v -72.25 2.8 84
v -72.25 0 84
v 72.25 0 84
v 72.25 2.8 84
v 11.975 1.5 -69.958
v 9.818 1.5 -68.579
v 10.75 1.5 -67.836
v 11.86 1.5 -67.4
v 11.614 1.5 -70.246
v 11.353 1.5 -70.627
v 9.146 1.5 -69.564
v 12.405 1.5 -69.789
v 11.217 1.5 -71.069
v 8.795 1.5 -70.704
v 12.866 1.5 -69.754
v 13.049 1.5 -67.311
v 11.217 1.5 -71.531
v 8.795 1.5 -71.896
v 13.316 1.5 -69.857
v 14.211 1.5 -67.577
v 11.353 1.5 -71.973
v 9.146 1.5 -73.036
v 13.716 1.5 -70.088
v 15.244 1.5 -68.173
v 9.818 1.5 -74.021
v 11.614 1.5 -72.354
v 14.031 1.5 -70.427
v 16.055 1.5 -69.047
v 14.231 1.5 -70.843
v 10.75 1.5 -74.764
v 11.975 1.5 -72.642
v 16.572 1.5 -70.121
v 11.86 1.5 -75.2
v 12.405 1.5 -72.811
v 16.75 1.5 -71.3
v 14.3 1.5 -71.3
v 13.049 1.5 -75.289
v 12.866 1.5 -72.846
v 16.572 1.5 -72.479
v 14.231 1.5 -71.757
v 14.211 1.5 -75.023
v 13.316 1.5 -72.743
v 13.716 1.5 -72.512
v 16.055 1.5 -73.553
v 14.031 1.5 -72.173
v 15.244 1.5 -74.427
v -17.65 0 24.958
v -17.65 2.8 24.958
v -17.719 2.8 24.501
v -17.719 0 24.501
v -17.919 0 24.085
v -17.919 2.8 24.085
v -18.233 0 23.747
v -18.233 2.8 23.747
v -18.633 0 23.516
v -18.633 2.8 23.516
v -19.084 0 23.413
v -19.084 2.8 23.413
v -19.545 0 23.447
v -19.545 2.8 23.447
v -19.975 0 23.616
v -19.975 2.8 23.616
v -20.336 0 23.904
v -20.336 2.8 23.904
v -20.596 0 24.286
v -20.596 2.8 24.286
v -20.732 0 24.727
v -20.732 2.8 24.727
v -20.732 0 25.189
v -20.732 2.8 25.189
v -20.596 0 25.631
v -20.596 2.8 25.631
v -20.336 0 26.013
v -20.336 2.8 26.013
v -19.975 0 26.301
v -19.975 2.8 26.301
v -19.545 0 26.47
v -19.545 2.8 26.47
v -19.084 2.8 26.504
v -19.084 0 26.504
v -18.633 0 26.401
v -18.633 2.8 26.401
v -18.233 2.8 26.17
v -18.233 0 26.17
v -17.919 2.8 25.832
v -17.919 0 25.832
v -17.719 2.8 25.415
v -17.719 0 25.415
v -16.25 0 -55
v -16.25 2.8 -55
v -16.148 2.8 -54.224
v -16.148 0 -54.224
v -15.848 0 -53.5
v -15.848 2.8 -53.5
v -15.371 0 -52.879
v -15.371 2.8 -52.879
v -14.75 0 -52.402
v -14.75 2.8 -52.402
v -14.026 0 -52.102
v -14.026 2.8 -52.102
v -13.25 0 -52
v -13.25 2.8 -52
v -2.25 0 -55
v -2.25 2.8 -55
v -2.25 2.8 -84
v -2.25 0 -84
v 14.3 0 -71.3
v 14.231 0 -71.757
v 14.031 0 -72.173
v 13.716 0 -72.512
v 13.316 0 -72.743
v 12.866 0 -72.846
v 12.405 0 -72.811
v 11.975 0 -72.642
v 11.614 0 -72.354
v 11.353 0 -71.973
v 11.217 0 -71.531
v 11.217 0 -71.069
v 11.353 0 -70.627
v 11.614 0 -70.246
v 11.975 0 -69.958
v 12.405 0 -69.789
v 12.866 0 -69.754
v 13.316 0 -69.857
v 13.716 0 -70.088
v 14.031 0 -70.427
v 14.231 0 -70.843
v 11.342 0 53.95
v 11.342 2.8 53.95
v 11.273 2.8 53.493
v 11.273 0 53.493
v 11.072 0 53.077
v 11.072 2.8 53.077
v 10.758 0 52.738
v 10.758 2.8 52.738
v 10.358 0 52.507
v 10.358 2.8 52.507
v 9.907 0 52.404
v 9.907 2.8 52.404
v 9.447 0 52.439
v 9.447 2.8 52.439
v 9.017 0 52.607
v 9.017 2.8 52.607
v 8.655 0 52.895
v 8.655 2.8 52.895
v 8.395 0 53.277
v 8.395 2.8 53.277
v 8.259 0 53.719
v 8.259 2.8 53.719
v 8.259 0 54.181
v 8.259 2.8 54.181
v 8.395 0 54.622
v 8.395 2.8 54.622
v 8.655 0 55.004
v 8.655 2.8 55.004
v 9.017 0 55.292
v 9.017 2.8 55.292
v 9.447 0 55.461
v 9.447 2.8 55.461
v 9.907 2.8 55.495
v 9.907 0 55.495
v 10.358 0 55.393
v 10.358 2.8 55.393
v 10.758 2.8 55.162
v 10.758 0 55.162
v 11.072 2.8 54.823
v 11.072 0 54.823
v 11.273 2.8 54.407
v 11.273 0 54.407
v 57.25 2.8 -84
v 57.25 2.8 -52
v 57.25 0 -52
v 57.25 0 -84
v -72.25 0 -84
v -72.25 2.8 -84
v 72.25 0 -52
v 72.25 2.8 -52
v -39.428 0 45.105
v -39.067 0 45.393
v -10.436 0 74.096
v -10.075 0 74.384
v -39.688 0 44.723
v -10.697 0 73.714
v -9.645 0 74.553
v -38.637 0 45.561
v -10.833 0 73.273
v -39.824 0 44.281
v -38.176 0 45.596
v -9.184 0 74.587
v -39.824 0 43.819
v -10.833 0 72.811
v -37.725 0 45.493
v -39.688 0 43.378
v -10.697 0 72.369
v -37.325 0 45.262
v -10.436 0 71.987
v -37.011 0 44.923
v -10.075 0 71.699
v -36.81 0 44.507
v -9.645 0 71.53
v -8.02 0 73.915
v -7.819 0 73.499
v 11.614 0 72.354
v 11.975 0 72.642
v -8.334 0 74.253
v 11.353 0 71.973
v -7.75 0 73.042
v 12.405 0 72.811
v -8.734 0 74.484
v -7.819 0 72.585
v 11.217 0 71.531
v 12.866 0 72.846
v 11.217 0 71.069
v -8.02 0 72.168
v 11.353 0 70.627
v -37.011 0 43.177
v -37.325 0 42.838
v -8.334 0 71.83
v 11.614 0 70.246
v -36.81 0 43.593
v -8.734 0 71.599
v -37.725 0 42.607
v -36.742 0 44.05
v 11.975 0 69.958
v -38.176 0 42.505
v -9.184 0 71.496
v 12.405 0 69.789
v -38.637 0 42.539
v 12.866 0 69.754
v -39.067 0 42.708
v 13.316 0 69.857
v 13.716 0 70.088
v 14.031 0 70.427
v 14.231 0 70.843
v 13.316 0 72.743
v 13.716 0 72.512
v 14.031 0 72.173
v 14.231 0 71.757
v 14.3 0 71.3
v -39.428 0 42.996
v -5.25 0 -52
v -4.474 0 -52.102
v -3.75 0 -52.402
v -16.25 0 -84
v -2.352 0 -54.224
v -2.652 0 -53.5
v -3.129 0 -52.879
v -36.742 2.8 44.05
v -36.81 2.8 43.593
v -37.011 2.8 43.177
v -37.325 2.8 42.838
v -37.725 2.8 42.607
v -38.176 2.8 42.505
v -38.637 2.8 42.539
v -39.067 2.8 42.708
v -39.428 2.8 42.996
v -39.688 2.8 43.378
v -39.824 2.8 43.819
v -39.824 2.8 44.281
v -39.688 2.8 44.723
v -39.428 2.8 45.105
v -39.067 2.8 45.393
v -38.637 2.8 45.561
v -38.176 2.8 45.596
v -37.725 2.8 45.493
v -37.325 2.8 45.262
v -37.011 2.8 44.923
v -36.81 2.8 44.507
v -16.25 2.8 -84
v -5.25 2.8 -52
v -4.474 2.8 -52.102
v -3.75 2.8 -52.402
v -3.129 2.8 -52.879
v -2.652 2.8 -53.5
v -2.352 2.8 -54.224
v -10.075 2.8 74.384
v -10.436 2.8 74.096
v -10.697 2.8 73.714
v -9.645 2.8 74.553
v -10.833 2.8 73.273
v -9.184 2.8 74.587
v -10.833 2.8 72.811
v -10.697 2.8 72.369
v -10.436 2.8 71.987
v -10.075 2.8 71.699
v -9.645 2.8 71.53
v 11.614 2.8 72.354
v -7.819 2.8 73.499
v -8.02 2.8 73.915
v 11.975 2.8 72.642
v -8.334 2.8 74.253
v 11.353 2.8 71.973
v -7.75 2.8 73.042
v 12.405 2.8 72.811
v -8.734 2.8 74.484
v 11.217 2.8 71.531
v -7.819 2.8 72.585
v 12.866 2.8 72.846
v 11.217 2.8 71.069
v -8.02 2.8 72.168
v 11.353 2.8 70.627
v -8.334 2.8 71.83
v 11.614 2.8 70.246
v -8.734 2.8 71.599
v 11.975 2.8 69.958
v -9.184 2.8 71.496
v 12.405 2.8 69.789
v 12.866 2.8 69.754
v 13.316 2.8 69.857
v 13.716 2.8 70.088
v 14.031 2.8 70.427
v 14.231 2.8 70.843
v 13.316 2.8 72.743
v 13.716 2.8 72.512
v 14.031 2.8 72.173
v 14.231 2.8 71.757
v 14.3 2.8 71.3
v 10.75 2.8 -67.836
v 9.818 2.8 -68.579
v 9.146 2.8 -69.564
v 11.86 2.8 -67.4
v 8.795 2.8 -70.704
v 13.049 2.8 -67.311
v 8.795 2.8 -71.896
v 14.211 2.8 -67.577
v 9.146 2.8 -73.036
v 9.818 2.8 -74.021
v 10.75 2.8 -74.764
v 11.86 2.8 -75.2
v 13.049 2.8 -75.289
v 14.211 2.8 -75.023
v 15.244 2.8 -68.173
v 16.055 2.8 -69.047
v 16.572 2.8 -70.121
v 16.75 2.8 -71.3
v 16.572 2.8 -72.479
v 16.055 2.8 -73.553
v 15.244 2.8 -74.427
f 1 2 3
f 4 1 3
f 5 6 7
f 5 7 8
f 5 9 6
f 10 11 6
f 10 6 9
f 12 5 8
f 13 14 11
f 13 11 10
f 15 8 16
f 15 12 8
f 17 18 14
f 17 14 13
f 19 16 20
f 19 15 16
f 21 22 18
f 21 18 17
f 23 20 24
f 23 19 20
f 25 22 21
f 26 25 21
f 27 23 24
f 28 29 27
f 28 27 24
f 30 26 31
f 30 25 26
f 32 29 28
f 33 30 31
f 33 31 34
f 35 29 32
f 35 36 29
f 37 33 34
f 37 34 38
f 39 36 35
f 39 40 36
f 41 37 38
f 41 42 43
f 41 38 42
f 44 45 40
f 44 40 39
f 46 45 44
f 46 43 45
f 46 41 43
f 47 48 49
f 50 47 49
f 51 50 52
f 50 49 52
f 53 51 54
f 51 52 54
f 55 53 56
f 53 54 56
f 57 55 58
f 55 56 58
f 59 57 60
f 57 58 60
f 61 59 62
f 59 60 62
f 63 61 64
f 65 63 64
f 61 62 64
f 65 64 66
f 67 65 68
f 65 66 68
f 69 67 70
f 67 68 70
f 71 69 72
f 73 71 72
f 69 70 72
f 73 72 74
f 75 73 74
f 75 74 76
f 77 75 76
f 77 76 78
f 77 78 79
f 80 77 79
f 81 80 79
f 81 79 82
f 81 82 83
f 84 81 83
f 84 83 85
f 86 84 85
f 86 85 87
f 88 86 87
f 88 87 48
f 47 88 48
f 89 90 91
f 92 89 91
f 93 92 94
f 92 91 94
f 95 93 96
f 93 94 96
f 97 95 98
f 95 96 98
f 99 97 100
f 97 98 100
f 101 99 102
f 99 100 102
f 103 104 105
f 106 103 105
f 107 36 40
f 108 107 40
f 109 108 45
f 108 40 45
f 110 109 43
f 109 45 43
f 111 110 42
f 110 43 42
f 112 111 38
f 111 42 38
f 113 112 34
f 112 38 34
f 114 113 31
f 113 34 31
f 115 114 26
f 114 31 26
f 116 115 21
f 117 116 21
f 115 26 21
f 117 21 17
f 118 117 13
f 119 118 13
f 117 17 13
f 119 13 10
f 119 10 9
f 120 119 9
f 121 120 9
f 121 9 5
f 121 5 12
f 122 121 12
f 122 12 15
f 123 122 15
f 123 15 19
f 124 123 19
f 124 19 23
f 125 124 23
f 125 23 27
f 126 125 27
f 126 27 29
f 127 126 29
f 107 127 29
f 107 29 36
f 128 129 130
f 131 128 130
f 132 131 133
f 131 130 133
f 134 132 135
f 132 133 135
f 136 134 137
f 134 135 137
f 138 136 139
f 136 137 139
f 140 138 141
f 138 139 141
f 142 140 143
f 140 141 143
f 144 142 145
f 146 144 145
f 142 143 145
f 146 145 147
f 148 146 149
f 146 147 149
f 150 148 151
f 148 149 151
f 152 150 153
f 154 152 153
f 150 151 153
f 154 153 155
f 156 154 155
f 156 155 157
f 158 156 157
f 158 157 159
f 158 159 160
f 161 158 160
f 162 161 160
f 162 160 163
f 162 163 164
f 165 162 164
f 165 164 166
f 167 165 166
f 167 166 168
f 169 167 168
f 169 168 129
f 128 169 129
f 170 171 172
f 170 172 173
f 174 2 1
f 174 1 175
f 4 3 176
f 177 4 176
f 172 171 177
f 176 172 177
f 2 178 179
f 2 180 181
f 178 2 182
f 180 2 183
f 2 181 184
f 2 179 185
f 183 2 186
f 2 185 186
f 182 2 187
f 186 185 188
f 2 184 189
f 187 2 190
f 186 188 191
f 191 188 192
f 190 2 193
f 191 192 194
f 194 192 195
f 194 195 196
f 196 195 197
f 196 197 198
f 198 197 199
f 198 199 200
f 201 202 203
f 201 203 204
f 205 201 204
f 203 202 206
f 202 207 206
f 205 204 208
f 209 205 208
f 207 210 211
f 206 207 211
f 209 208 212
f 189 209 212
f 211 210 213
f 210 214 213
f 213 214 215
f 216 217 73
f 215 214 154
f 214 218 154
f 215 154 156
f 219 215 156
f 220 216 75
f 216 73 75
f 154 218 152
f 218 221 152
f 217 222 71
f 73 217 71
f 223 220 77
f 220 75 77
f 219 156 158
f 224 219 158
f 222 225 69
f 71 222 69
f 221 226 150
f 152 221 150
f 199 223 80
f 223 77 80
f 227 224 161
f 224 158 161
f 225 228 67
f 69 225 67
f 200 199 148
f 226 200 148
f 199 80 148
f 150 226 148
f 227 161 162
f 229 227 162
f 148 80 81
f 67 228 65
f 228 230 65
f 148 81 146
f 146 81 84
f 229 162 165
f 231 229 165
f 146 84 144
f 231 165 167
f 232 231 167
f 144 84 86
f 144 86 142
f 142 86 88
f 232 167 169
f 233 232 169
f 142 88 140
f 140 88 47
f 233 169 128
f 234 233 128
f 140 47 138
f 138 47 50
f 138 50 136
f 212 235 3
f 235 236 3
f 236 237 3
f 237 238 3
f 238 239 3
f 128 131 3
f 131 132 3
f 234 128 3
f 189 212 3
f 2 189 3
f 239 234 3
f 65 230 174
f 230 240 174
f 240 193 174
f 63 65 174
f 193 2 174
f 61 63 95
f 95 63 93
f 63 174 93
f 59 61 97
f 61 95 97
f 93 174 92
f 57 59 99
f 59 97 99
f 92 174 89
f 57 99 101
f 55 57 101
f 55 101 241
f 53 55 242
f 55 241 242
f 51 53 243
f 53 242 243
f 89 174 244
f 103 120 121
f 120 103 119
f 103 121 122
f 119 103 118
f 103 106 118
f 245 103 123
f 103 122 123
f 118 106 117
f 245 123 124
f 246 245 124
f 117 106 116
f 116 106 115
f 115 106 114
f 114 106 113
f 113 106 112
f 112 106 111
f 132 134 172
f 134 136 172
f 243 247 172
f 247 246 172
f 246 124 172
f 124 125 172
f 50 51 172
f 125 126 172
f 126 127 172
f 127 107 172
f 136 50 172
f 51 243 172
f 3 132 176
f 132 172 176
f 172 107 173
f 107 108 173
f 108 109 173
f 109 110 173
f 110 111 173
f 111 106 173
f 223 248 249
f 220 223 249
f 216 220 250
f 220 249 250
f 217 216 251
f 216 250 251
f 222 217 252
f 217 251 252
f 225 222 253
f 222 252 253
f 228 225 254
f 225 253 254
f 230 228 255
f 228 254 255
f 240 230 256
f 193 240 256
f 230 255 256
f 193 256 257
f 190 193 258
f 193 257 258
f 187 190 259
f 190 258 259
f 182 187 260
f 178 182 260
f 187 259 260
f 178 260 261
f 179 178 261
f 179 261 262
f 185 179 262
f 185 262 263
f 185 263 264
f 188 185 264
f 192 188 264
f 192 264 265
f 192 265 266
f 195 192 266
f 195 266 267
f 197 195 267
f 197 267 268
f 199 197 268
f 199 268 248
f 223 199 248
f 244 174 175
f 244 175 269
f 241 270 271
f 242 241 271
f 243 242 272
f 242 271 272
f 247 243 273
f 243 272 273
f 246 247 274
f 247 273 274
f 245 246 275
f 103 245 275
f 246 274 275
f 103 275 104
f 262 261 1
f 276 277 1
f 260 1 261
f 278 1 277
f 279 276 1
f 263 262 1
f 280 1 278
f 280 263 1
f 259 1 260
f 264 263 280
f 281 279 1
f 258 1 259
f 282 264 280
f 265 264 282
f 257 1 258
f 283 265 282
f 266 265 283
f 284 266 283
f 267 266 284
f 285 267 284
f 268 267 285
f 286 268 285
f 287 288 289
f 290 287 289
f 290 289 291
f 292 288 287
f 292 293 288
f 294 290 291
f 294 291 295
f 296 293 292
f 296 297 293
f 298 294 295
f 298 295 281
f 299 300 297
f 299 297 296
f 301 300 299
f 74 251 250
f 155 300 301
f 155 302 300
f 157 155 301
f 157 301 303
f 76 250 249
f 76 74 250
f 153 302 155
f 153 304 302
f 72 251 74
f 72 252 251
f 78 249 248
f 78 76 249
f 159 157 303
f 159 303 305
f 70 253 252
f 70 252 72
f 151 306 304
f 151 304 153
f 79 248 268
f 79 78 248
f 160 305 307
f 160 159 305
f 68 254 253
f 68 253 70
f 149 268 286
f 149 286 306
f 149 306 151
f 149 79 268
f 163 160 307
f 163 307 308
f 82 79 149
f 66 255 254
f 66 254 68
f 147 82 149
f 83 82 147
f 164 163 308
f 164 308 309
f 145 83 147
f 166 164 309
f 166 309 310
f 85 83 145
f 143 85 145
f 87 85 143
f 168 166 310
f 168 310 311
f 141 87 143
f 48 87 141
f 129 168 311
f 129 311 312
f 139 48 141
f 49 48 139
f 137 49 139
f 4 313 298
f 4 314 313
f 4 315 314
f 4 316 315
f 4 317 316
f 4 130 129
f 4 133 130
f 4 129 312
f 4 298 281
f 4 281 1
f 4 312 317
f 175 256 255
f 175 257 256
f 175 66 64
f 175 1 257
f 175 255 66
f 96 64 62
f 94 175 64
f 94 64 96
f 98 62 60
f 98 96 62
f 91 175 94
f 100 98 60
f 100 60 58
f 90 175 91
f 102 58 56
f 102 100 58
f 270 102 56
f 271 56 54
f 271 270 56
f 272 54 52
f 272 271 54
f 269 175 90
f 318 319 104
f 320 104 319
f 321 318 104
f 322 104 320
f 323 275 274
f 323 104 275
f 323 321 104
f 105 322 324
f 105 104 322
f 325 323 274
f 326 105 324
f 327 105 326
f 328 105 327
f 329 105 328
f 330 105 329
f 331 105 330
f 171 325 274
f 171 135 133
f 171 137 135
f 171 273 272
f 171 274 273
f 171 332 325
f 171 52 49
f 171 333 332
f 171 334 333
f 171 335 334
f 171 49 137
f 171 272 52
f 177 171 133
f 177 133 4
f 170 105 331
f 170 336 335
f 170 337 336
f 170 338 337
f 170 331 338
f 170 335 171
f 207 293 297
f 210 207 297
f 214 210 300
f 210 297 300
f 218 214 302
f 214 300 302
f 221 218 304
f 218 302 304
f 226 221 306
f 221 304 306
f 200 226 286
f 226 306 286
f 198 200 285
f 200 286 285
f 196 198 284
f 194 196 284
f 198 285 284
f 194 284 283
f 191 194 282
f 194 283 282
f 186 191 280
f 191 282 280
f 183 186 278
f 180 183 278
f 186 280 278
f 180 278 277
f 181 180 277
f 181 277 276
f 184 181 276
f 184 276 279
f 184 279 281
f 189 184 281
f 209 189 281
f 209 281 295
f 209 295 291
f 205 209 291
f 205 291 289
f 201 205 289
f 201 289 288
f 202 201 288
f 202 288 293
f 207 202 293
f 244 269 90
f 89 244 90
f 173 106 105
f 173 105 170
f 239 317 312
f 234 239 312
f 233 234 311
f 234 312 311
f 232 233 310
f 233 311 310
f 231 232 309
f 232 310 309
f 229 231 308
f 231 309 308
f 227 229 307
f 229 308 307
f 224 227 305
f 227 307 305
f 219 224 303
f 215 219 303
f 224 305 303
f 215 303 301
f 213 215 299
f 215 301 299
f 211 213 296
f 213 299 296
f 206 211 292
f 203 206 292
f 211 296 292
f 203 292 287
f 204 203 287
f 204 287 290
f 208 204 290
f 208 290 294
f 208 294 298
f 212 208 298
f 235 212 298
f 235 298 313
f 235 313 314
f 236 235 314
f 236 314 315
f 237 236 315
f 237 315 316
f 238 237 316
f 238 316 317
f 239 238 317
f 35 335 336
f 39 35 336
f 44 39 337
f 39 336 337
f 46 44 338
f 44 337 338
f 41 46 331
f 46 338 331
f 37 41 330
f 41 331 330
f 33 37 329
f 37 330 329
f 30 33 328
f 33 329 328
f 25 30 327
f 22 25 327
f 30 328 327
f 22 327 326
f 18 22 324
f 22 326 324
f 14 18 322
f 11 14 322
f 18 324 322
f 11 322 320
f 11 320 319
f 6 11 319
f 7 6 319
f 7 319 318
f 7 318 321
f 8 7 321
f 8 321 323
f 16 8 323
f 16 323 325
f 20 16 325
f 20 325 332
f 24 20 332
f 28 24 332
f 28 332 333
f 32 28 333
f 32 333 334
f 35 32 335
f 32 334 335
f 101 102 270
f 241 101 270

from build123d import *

# Parameters (mm, degrees)
SKETCH1_W           = 144.5
SKETCH1_H           = 168
BOSS_EXTRUDE1_DEPTH = 2.8
CUT_EXTRUDE1_REACH  = 4.8
SKETCH2_R           = 1.55
SKETCH2_W           = 15
SKETCH2_H           = 32
CUT_EXTRUDE2_REACH  = 4.8
SKETCH5_R           = 1.55
SKETCH6_R           = 4
CUT_EXTRUDE3_DEPTH  = 1.3
CUT_EXTRUDE4_REACH  = 4.8


with BuildPart() as part:
    # Sketch1 → Boss-Extrude1 (new body)
    with BuildSketch(Plane(origin=(0, 0, 0), x_dir=(1, 0, 0), z_dir=(0, 1, 0))):
        Rectangle(SKETCH1_W, SKETCH1_H)
    extrude(amount=BOSS_EXTRUDE1_DEPTH)

    # Sketch2 → Cut-Extrude1 (cut, up to next)
    with BuildSketch(Plane(origin=(0, 2.8, 0), x_dir=(1, 0, 0), z_dir=(0, 1, 0)), mode=Mode.PRIVATE) as cut_extrude1_sk1:
        with Locations((-19.199747468, -24.95836944)):
            Circle(SKETCH2_R)
    cut_extrude1_tool1 = extrude(cut_extrude1_sk1.sketch, amount=-CUT_EXTRUDE1_REACH, mode=Mode.PRIVATE) & part.part
    add(cut_extrude1_tool1.solids().sort_by_distance((-19.199747, 2.8, 24.958369))[0], mode=Mode.SUBTRACT)
    # Sketch2 → Cut-Extrude1 (cut, up to next)
    with BuildSketch(Plane(origin=(0, 2.8, 0), x_dir=(1, 0, 0), z_dir=(0, 1, 0)), mode=Mode.PRIVATE) as cut_extrude1_sk2:
        with Locations((9.79163056, -53.949747468)):
            Circle(SKETCH2_R)
    cut_extrude1_tool2 = extrude(cut_extrude1_sk2.sketch, amount=-CUT_EXTRUDE1_REACH, mode=Mode.PRIVATE) & part.part
    add(cut_extrude1_tool2.solids().sort_by_distance((9.791631, 2.8, 53.949747))[0], mode=Mode.SUBTRACT)
    # Sketch2 → Cut-Extrude1 (cut, up to next)
    with BuildSketch(Plane(origin=(0, 2.8, 0), x_dir=(1, 0, 0), z_dir=(0, 1, 0)), mode=Mode.PRIVATE) as cut_extrude1_sk3:
        with Locations((-9.300252532, -73.04163056)):
            Circle(SKETCH2_R)
    cut_extrude1_tool3 = extrude(cut_extrude1_sk3.sketch, amount=-CUT_EXTRUDE1_REACH, mode=Mode.PRIVATE) & part.part
    add(cut_extrude1_tool3.solids().sort_by_distance((-9.300253, 2.8, 73.041631))[0], mode=Mode.SUBTRACT)
    # Sketch2 → Cut-Extrude1 (cut, up to next)
    with BuildSketch(Plane(origin=(0, 2.8, 0), x_dir=(1, 0, 0), z_dir=(0, 1, 0)), mode=Mode.PRIVATE) as cut_extrude1_sk4:
        with Locations((-38.29163056, -44.050252532)):
            Circle(SKETCH2_R)
    cut_extrude1_tool4 = extrude(cut_extrude1_sk4.sketch, amount=-CUT_EXTRUDE1_REACH, mode=Mode.PRIVATE) & part.part
    add(cut_extrude1_tool4.solids().sort_by_distance((-38.291631, 2.8, 44.050253))[0], mode=Mode.SUBTRACT)
    # Sketch2 → Cut-Extrude1 (cut, up to next)
    with BuildSketch(Plane(origin=(0, 2.8, 0), x_dir=(1, 0, 0), z_dir=(0, 1, 0)), mode=Mode.PRIVATE) as cut_extrude1_sk5:
        with Locations((64.75, 68)):
            Rectangle(SKETCH2_W, SKETCH2_H)
    cut_extrude1_tool5 = extrude(cut_extrude1_sk5.sketch, amount=-CUT_EXTRUDE1_REACH, mode=Mode.PRIVATE) & part.part
    add(cut_extrude1_tool5.solids().sort_by_distance((64.75, 2.8, -68))[0], mode=Mode.SUBTRACT)

    # Sketch5 → Cut-Extrude2 (cut, up to next)
    with BuildSketch(Plane(origin=(0, 2.8, 0), x_dir=(1, 0, 0), z_dir=(0, 1, 0)), mode=Mode.PRIVATE) as cut_extrude2_sk1:
        with Locations((12.75, 71.3)):
            Circle(SKETCH5_R)
    cut_extrude2_tool1 = extrude(cut_extrude2_sk1.sketch, amount=-CUT_EXTRUDE2_REACH, mode=Mode.PRIVATE) & part.part
    add(cut_extrude2_tool1.solids().sort_by_distance((12.75, 2.8, -71.3))[0], mode=Mode.SUBTRACT)
    # Sketch5 → Cut-Extrude2 (cut, up to next)
    with BuildSketch(Plane(origin=(0, 2.8, 0), x_dir=(1, 0, 0), z_dir=(0, 1, 0)), mode=Mode.PRIVATE) as cut_extrude2_sk2:
        with Locations((12.75, -71.3)):
            Circle(SKETCH5_R)
    cut_extrude2_tool2 = extrude(cut_extrude2_sk2.sketch, amount=-CUT_EXTRUDE2_REACH, mode=Mode.PRIVATE) & part.part
    add(cut_extrude2_tool2.solids().sort_by_distance((12.75, 2.8, 71.3))[0], mode=Mode.SUBTRACT)

    # Sketch6 → Cut-Extrude3 (cut)
    with BuildSketch(Plane(origin=(0, 2.8, 0), x_dir=(1, 0, 0), z_dir=(0, 1, 0))):
        with Locations((12.75, 71.3)):
            Circle(SKETCH6_R)
    extrude(amount=-CUT_EXTRUDE3_DEPTH, mode=Mode.SUBTRACT)

    # Sketch7 → Cut-Extrude4 (cut, up to next)
    with BuildSketch(Plane(origin=(0, 2.8, 0), x_dir=(1, 0, 0), z_dir=(0, 1, 0)), mode=Mode.PRIVATE) as cut_extrude4_sk1:
        with BuildLine():
            Line((-16.25, 84), (-16.25, 55))
            ThreePointArc((-16.25, 55), (-15.371320344, 52.878679656), (-13.25, 52))
            Line((-13.25, 52), (-5.25, 52))
            ThreePointArc((-5.25, 52), (-3.128679656, 52.878679656), (-2.25, 55))
            Line((-2.25, 55), (-2.25, 84))
            Line((-2.25, 84), (-16.25, 84))
        make_face()
    cut_extrude4_tool1 = extrude(cut_extrude4_sk1.sketch, amount=-CUT_EXTRUDE4_REACH, mode=Mode.PRIVATE) & part.part
    add(cut_extrude4_tool1.solids().sort_by_distance((-9.25, 2.8, -68.13333))[0], mode=Mode.SUBTRACT)


solid = part.part
